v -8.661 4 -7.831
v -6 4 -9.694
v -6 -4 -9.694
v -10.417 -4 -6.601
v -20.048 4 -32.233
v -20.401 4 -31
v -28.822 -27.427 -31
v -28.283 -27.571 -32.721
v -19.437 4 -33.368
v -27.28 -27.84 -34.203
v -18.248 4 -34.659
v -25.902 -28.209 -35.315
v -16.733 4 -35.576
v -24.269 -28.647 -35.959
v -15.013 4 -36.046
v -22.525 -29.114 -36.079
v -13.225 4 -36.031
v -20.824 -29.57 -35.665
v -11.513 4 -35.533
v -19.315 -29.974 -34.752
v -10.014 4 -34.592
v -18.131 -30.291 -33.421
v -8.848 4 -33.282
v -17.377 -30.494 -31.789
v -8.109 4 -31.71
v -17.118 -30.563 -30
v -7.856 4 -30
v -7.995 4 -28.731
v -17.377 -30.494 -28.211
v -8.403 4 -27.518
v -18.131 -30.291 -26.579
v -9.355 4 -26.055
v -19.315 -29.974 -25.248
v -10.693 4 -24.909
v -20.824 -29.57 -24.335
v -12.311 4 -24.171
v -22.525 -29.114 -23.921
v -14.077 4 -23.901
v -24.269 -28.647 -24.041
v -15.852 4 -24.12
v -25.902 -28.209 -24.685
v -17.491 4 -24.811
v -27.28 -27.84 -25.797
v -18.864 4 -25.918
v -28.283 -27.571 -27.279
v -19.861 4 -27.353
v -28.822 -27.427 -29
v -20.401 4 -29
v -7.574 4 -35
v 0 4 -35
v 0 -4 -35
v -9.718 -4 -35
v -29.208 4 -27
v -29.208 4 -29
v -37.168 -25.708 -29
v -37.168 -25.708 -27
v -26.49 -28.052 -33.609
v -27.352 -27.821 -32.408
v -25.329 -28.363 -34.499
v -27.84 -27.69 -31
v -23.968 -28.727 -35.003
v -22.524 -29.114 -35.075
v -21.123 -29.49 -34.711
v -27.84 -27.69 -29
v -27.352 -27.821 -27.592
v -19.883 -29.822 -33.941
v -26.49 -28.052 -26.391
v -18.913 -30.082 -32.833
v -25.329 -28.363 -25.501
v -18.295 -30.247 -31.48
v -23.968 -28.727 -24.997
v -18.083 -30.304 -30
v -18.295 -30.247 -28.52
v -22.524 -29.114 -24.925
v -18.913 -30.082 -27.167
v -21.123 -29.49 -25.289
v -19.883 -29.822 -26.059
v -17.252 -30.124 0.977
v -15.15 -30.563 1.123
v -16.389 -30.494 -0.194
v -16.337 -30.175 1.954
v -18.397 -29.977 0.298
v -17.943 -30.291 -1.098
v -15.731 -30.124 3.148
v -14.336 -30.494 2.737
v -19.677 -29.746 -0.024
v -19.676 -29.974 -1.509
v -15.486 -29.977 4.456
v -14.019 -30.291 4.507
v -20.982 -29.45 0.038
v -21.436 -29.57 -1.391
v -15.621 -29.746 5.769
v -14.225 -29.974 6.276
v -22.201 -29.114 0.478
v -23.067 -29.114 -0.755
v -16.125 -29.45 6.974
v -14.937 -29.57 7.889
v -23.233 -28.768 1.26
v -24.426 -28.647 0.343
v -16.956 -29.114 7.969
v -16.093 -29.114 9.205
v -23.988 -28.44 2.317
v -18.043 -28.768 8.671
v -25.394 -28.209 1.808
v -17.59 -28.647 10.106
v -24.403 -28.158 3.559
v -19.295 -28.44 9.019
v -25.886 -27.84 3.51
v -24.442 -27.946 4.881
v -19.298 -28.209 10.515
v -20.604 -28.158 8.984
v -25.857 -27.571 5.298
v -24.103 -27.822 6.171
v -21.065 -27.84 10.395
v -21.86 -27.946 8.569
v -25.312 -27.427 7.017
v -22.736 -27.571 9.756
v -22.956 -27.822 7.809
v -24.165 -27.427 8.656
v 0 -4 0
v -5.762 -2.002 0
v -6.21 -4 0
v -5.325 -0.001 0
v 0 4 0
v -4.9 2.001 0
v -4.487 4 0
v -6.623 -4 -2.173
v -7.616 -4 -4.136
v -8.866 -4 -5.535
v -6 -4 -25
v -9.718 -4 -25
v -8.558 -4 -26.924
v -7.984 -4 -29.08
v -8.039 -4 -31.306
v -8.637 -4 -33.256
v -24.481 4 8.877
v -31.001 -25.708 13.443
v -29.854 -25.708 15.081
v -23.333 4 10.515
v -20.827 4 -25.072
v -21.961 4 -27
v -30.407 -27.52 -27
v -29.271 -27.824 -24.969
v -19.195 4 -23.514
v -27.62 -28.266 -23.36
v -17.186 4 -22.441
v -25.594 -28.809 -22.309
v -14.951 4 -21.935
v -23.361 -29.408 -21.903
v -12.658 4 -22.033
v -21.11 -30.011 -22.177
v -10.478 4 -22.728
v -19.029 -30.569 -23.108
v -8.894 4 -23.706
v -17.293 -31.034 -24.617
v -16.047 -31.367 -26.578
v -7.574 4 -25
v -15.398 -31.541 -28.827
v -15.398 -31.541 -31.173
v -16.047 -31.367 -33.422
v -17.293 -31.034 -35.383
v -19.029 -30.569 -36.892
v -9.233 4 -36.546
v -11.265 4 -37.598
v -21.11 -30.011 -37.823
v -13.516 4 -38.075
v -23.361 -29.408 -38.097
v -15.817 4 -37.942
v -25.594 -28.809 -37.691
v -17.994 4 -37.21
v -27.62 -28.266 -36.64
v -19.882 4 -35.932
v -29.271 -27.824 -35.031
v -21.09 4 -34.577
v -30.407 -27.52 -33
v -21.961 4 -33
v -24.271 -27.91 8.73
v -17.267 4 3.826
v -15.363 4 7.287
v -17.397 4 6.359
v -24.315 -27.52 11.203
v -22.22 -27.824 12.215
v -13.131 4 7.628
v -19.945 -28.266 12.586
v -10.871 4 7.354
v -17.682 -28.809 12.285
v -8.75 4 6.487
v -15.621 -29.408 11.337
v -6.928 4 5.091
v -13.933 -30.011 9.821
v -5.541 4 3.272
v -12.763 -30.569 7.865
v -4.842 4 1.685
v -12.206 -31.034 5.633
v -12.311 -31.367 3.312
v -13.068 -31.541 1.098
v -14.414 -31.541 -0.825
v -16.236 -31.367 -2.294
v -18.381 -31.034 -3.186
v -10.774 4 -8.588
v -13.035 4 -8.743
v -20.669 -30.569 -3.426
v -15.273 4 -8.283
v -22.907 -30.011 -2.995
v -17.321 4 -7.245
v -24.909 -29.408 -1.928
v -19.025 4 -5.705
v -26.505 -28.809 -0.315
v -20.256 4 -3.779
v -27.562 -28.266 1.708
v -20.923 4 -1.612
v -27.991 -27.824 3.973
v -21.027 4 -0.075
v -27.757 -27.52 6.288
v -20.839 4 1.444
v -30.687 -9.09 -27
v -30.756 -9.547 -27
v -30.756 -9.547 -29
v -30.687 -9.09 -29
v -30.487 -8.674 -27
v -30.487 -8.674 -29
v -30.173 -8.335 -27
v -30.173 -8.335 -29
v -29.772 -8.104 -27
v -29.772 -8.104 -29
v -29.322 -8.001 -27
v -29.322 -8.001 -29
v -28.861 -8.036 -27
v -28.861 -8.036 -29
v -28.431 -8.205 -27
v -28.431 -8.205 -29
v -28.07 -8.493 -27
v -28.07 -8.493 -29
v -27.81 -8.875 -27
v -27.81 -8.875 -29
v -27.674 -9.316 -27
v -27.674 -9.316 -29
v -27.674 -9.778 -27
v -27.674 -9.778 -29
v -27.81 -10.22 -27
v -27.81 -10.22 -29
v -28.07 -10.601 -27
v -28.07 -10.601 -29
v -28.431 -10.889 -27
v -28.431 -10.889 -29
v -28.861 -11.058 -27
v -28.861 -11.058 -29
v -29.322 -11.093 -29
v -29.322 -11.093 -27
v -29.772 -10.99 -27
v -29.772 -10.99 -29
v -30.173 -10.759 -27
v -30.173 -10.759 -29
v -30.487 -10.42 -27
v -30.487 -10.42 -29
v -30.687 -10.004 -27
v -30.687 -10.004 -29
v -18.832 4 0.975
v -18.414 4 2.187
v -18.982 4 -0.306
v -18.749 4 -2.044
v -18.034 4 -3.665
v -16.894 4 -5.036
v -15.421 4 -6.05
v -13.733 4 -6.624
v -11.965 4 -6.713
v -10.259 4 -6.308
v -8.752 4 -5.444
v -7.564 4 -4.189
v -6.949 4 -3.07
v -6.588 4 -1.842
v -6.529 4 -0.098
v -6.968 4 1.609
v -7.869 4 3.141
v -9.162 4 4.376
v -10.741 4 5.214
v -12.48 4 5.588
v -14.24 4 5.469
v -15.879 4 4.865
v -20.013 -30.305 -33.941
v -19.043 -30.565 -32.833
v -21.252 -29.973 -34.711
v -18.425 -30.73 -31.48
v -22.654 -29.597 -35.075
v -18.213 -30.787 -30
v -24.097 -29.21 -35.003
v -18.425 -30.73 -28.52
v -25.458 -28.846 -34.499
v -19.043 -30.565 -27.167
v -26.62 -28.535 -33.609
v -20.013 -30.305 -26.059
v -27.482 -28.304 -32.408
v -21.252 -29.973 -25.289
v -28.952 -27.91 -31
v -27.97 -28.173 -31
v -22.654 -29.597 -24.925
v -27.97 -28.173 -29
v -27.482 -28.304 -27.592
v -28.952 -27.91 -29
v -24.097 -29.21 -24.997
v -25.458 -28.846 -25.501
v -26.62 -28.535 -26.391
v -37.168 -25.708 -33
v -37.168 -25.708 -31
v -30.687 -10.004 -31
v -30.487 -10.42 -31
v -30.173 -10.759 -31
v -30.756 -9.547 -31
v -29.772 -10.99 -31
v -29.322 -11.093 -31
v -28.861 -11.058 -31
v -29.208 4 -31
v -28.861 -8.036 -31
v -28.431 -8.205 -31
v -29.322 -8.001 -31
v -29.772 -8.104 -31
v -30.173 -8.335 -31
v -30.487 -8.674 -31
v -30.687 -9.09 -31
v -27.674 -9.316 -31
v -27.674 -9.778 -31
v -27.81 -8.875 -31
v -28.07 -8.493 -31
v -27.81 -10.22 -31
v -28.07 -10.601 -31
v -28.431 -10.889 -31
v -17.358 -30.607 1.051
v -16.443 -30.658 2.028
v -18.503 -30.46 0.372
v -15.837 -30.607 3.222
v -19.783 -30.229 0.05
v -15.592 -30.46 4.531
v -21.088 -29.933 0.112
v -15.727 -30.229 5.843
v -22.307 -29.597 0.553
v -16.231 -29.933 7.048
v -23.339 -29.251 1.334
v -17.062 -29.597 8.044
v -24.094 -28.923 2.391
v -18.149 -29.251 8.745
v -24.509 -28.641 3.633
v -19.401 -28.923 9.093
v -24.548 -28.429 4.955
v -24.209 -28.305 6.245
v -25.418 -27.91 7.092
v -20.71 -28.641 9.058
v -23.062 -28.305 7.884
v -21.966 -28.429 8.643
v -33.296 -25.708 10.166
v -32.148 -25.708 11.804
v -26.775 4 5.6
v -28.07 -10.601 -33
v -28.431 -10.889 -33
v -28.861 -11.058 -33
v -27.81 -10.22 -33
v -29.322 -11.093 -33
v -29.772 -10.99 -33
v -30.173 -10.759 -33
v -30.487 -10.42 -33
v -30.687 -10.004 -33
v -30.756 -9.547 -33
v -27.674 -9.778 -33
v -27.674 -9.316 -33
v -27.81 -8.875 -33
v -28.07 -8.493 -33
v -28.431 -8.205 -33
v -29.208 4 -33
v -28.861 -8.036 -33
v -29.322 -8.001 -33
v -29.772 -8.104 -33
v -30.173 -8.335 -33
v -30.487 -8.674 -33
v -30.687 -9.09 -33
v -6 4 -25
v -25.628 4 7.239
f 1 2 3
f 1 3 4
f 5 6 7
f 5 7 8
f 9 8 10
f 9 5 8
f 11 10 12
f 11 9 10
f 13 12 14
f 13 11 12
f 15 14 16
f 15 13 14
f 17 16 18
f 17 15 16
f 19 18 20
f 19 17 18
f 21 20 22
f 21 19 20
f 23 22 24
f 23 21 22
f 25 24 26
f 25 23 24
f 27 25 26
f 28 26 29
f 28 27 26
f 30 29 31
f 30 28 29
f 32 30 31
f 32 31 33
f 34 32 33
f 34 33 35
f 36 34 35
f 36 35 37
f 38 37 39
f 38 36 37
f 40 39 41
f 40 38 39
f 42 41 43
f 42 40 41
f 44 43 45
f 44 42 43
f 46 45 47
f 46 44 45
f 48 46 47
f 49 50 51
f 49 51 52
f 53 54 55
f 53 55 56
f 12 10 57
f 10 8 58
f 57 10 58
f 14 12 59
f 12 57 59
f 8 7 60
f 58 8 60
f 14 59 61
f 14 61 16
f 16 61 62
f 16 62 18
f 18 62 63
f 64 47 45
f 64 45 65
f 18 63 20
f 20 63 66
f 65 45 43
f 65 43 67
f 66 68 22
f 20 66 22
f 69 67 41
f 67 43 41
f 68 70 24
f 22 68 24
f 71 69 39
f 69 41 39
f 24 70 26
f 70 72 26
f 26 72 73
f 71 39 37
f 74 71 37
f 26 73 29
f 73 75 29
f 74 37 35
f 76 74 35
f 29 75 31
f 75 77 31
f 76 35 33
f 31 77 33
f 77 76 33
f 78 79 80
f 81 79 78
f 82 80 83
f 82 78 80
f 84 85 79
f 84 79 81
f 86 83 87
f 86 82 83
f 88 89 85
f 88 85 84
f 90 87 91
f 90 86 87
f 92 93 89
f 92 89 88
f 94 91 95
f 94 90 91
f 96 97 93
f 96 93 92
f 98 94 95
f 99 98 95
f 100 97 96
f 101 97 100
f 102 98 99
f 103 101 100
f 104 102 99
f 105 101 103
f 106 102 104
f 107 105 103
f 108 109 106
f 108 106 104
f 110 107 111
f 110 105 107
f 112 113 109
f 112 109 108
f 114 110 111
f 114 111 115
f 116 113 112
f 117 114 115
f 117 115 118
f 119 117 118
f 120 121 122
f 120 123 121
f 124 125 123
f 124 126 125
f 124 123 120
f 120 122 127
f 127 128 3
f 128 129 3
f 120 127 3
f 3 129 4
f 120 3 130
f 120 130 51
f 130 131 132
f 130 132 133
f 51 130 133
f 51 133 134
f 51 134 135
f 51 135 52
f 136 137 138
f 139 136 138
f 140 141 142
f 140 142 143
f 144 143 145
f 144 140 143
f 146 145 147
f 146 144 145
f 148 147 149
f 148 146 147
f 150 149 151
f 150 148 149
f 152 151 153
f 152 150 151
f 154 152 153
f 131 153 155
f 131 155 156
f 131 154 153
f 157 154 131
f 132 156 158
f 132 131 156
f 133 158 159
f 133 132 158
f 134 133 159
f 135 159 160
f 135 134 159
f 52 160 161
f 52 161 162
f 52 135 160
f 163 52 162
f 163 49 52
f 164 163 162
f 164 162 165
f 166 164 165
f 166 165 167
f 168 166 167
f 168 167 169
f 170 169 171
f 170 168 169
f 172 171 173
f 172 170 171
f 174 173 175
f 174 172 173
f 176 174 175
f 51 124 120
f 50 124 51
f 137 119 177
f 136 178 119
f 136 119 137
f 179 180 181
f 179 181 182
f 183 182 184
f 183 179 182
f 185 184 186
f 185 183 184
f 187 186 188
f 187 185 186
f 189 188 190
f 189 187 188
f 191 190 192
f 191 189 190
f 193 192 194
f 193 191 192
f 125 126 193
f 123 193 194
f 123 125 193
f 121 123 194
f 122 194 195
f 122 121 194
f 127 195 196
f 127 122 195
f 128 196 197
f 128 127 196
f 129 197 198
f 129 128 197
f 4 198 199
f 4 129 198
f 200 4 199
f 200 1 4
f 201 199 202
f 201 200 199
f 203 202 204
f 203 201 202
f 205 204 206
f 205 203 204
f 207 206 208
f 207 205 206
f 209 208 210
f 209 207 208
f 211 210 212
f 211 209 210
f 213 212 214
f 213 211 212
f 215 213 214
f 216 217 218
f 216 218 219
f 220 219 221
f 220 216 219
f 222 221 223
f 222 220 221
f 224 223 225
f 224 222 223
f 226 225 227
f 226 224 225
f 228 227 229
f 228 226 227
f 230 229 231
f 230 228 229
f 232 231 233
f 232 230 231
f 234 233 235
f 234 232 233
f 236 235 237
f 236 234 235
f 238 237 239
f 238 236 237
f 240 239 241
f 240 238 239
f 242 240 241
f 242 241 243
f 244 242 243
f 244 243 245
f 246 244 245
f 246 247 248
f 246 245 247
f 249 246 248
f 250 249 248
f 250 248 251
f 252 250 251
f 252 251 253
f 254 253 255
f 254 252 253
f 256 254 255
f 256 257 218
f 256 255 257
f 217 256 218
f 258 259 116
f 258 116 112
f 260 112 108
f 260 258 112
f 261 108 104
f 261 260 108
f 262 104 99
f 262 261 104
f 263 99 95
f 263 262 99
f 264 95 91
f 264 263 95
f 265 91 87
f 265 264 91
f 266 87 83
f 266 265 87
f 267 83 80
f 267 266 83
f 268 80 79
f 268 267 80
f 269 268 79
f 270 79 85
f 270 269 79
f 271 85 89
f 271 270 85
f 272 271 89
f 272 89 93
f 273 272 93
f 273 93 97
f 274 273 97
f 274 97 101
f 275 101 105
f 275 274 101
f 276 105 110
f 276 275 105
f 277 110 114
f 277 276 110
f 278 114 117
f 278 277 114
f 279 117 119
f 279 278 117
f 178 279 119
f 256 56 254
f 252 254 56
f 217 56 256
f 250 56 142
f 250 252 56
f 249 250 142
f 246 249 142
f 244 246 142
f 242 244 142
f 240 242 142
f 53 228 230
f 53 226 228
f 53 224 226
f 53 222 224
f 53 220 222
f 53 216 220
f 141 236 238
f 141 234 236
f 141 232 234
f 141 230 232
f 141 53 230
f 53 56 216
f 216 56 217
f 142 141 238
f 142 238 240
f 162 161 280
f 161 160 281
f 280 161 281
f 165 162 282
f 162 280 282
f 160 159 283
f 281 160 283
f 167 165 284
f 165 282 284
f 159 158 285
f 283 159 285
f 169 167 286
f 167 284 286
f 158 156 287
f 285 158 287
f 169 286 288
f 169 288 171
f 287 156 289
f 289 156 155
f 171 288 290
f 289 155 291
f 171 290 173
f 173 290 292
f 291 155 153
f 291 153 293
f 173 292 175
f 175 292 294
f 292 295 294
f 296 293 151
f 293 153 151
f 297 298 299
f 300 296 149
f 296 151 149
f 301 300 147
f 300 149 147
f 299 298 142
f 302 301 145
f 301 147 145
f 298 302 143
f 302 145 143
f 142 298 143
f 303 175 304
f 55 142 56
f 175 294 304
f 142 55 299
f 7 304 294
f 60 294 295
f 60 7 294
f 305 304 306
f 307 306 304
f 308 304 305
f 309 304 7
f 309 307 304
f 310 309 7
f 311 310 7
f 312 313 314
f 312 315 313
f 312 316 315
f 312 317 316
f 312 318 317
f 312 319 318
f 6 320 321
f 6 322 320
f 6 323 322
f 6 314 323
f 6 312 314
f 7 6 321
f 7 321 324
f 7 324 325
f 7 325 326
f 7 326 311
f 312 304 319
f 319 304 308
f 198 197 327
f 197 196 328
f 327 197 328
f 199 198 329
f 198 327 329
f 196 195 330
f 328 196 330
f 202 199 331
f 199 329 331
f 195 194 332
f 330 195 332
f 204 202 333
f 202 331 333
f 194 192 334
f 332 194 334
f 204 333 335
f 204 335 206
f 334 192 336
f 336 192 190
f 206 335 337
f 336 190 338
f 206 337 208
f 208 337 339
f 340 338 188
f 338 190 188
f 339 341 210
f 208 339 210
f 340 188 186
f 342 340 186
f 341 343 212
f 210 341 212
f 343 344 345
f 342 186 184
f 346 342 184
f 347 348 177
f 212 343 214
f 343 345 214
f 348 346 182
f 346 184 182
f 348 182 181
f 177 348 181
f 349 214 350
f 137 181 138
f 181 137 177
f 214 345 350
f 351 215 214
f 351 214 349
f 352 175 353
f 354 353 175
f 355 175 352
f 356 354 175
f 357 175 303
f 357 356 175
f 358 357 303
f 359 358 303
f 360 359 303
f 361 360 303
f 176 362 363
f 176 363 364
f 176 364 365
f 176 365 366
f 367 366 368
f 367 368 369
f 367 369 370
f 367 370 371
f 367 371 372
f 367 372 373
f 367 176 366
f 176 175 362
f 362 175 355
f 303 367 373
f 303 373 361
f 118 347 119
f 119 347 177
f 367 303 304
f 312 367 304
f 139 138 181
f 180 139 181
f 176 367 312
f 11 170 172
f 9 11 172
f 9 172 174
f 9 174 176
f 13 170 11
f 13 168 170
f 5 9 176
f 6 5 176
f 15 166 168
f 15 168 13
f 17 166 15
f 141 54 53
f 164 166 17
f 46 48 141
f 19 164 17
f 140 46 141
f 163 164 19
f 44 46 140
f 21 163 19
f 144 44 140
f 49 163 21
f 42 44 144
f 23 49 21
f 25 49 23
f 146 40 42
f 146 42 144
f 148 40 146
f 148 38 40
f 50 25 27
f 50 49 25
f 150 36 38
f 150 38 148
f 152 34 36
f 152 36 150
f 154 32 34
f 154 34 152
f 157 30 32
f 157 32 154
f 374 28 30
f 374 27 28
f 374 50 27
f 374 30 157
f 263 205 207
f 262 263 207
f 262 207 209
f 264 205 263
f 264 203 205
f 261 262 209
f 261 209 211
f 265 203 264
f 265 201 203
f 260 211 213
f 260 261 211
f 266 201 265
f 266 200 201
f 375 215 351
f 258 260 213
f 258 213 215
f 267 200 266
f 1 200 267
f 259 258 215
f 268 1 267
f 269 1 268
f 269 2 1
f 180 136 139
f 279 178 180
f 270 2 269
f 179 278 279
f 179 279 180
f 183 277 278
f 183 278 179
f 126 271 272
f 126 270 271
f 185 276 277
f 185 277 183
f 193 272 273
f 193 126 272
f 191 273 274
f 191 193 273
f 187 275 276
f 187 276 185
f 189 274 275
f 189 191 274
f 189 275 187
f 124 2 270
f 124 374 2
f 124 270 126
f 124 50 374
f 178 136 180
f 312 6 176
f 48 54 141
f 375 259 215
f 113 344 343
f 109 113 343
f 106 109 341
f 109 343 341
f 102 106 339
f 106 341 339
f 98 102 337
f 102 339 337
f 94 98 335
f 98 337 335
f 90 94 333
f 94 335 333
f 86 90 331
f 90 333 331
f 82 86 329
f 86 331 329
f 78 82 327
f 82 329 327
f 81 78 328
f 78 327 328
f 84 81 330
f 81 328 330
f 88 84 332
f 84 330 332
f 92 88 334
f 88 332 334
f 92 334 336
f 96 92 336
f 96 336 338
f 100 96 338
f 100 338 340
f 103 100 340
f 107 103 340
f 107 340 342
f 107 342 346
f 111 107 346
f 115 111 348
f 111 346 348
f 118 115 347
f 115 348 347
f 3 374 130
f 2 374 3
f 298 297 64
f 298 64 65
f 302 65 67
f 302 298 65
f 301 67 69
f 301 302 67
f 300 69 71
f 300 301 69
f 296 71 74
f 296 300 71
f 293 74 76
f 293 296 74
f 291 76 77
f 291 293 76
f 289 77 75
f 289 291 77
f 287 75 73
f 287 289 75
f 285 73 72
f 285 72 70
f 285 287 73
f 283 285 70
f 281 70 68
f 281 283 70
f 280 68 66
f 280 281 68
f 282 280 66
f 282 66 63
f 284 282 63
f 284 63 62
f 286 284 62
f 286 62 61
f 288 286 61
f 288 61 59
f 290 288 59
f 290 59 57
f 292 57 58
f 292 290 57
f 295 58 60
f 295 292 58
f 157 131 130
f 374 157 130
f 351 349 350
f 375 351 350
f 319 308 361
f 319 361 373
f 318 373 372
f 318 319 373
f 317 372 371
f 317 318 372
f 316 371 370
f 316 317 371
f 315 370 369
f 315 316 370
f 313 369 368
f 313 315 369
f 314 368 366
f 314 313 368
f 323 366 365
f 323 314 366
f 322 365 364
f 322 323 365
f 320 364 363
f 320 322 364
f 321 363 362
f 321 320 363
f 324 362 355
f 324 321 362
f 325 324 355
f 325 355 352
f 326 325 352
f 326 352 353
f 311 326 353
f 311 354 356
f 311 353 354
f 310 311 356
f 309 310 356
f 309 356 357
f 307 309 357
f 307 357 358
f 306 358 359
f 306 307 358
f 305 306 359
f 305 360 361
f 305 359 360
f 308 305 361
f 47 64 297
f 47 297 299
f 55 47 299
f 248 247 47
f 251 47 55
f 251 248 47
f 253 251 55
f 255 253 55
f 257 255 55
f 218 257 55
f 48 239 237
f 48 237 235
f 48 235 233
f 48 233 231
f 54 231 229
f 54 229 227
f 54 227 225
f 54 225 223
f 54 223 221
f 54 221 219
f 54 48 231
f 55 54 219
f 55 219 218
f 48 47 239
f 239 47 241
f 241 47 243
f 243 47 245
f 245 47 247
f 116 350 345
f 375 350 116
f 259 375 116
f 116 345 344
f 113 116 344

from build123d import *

# Parameters (mm, degrees)
BOSS_EXTRUDE1_DEPTH             = 4
CUT_EXTRUDE2_DEPTH              = 10
BOSS_EXTRUDE2_REACH             = 59.846
BOSS_EXTRUDE2_DIRECTION_2_DEPTH = 28
CUT_EXTRUDE3_DEPTH              = 61.022744116
CUT_EXTRUDE3_DEPTH_BACK         = 61.022744116
SKETCH5_R                       = 1.55
BOSS_EXTRUDE3_DEPTH             = 0.5
CUT_EXTRUDE4_DEPTH              = 53.565024349
BOSS_EXTRUDE4_REACH             = 61.205
BOSS_EXTRUDE4_DIRECTION_2_DEPTH = 28
BOSS_EXTRUDE5_DEPTH             = 0.5


with BuildPart() as part:
    # Sketch1 → Boss-Extrude1 (new, symmetric)
    with BuildSketch(Plane(origin=(0, 0, 0), x_dir=(0, 0, -1), z_dir=(0, 1, 0))):
        Polygon((0, 7.247768223), (0, 0), (35, 0), (35, 10), (25, 10), (25, 6), (9.694351386, 6), (5.918748122, 11.392120275), align=None)
    extrude(amount=BOSS_EXTRUDE1_DEPTH, both=True)

    # Sketch4 → Cut-Extrude2 (cut)
    with BuildSketch(Plane(origin=(0, 0, -35), x_dir=(-1, 0, 0), z_dir=(0, 0, -1))):
        Polygon((10, 4), (7.856406461, 4), (10, -4), align=None)
    extrude(amount=-CUT_EXTRUDE2_DEPTH, mode=Mode.SUBTRACT)

    # Boss-Extrude2: up to this plane
    boss_extrude2_end = Plane(origin=(0, 4, 0), z_dir=(0, 1, 0))
    # Sketch2 → Boss-Extrude2 (add, up to the surface)
    with BuildSketch(Plane(origin=(2.479828187, -7.343959884, 20), x_dir=(-0.96592582628907, 0.25881904510251447, 0), z_dir=(0.25881904510251447, 0.96592582628907, 0)), mode=Mode.PRIVATE) as boss_extrude2_sk1:
        with BuildLine():
            Line((25.037543411, -49), (33.54403058, -49))
            Line((33.54403058, -49), (33.54403058, -47))
            Line((33.54403058, -47), (26.54403058, -47))
            ThreePointArc((26.54403058, -47), (10.920068858, -50), (26.54403058, -53))
            Line((26.54403058, -53), (33.54403058, -53))
            Line((33.54403058, -53), (33.54403058, -51))
            Line((33.54403058, -51), (25.037543411, -51))
            ThreePointArc((25.037543411, -51), (12.920068858, -50), (25.037543411, -49))
        make_face()
    boss_extrude2_tool1 = split(extrude(boss_extrude2_sk1.sketch, amount=BOSS_EXTRUDE2_REACH, mode=Mode.PRIVATE), bisect_by=boss_extrude2_end, keep=Keep.BOTH, mode=Mode.PRIVATE)
    add(boss_extrude2_tool1.solids().sort_by_distance((-25.812899, 0.237054, -28.72174))[0])

    # Sketch2 → Boss-Extrude2 direction 2 (add)
    with BuildSketch(Plane(origin=(2.479828187, -7.343959884, 20), x_dir=(-0.96592582628907, 0.25881904510251447, 0), z_dir=(0.25881904510251447, 0.96592582628907, 0))):
        with BuildLine():
            Line((25.037543411, -49), (33.54403058, -49))
            Line((33.54403058, -49), (33.54403058, -47))
            Line((33.54403058, -47), (26.54403058, -47))
            ThreePointArc((26.54403058, -47), (10.920068858, -50), (26.54403058, -53))
            Line((26.54403058, -53), (33.54403058, -53))
            Line((33.54403058, -53), (33.54403058, -51))
            Line((33.54403058, -51), (25.037543411, -51))
            ThreePointArc((25.037543411, -51), (12.920068858, -50), (25.037543411, -49))
        make_face()
    extrude(amount=-BOSS_EXTRUDE2_DIRECTION_2_DEPTH)

    # Sketch5 → Cut-Extrude3 (cut, two sides: drawn at the far end of the back side and taken through both)
    with BuildSketch(Plane(origin=(0, 0, -35), x_dir=(-1, 0, 0), z_dir=(0, 0, -1)).offset(-CUT_EXTRUDE3_DEPTH_BACK)):
        with Locations((29.206205162, -9.547072736)):
            Circle(SKETCH5_R)
    extrude(amount=CUT_EXTRUDE3_DEPTH + CUT_EXTRUDE3_DEPTH_BACK, mode=Mode.SUBTRACT)

    # Sketch7 → Boss-Extrude3 (add)
    with BuildSketch(Plane(origin=(-8.916806244, -33.277973944, 0), x_dir=(-0.96592582628907, 0.2588190451025145, 0), z_dir=(0.2588190451025145, 0.96592582628907, 0))):
        with BuildLine():
            Line((20.944110699, -29), (19.724981983, -29))
            ThreePointArc((19.724981983, -29), (9.623982082, -30), (19.724981983, -31))
            Line((19.724981983, -31), (20.944110699, -31))
            ThreePointArc((20.944110699, -31), (8.423982082, -30), (20.944110699, -29))
        make_face()
    extrude(amount=BOSS_EXTRUDE3_DEPTH)

    # Sketch8 → Cut-Extrude4 (cut, through all)
    with BuildSketch(Plane(origin=(-6.5287948, 0, -9.32408528), x_dir=(-0.819152044288991, 0, 0.5735764363510473), z_dir=(-0.5735764363510473, 0, -0.819152044288991))):
        Polygon((5.937024156, 4), (5.937024156, -4), (3.793430617, 4), align=None)
    extrude(amount=-CUT_EXTRUDE4_DEPTH, mode=Mode.SUBTRACT)

    # Boss-Extrude4: up to this plane
    boss_extrude4_end = Plane(origin=(0, 4, 0), z_dir=(0, 1, 0))
    # Sketch9 → Boss-Extrude4 (add, up to the surface)
    with BuildSketch(Plane(origin=(-1.144933078, -5.216306847, 0.801690772), x_dir=(-0.5735764363510472, 0, -0.819152044288991), z_dir=(0.21201214989664938, 0.96592582628907, -0.14845250554968126)), mode=Mode.PRIVATE) as boss_extrude4_sk1:
        with BuildLine():
            Line((6.769877721, 16.816923337), (6.769877721, 25.323410506))
            Line((6.769877721, 25.323410506), (4.769877721, 25.323410506))
            Line((4.769877721, 25.323410506), (4.769877721, 18.323410506))
            ThreePointArc((4.769877721, 18.323410506), (7.769877721, 2.699448783), (10.769877721, 18.323410506))
            Line((10.769877721, 18.323410506), (10.769877721, 25.323410506))
            Line((10.769877721, 25.323410506), (8.769877721, 25.323410506))
            Line((8.769877721, 25.323410506), (8.769877721, 16.816923337))
            ThreePointArc((8.769877721, 16.816923337), (7.769877721, 4.699448783), (6.769877721, 16.816923337))
        make_face()
    boss_extrude4_tool1 = split(extrude(boss_extrude4_sk1.sketch, amount=BOSS_EXTRUDE4_REACH, mode=Mode.PRIVATE), bisect_by=boss_extrude4_end, keep=Keep.BOTH, mode=Mode.PRIVATE)
    add(boss_extrude4_tool1.solids().sort_by_distance((-21.539934, 0.237054, 7.157621))[0])

    # Sketch9 → Boss-Extrude4 direction 2 (add)
    with BuildSketch(Plane(origin=(-1.144933078, -5.216306847, 0.801690772), x_dir=(-0.5735764363510472, 0, -0.819152044288991), z_dir=(0.21201214989664938, 0.96592582628907, -0.14845250554968126))):
        with BuildLine():
            Line((6.769877721, 16.816923337), (6.769877721, 25.323410506))
            Line((6.769877721, 25.323410506), (4.769877721, 25.323410506))
            Line((4.769877721, 25.323410506), (4.769877721, 18.323410506))
            ThreePointArc((4.769877721, 18.323410506), (7.769877721, 2.699448783), (10.769877721, 18.323410506))
            Line((10.769877721, 18.323410506), (10.769877721, 25.323410506))
            Line((10.769877721, 25.323410506), (8.769877721, 25.323410506))
            Line((8.769877721, 25.323410506), (8.769877721, 16.816923337))
            ThreePointArc((8.769877721, 16.816923337), (7.769877721, 4.699448783), (6.769877721, 16.816923337))
        make_face()
    extrude(amount=-BOSS_EXTRUDE4_DIRECTION_2_DEPTH)

    # Sketch10 → Boss-Extrude5 (add)
    with BuildSketch(Plane(origin=(-7.081273275, -32.262229983, 4.958360927), x_dir=(0.9766546875566917, -0.2147970934280116, -0.0027982009254068387), z_dir=(-0.21201214989664938, -0.96592582628907, 0.14845250554968126))):
        with BuildLine():
            Line((-16.465765356, 2.911480582), (-17.901629513, 3.876715105))
            ThreePointArc((-17.901629513, 3.876715105), (-8.068915493, -3.938101309), (-19.017417439, 2.216890625))
            Line((-19.017417439, 2.216890625), (-17.581553282, 1.251656102))
            ThreePointArc((-17.581553282, 1.251656102), (-9.479766301, -2.989681571), (-16.465765356, 2.911480582))
        make_face()
    extrude(amount=-BOSS_EXTRUDE5_DEPTH)


solid = part.part
